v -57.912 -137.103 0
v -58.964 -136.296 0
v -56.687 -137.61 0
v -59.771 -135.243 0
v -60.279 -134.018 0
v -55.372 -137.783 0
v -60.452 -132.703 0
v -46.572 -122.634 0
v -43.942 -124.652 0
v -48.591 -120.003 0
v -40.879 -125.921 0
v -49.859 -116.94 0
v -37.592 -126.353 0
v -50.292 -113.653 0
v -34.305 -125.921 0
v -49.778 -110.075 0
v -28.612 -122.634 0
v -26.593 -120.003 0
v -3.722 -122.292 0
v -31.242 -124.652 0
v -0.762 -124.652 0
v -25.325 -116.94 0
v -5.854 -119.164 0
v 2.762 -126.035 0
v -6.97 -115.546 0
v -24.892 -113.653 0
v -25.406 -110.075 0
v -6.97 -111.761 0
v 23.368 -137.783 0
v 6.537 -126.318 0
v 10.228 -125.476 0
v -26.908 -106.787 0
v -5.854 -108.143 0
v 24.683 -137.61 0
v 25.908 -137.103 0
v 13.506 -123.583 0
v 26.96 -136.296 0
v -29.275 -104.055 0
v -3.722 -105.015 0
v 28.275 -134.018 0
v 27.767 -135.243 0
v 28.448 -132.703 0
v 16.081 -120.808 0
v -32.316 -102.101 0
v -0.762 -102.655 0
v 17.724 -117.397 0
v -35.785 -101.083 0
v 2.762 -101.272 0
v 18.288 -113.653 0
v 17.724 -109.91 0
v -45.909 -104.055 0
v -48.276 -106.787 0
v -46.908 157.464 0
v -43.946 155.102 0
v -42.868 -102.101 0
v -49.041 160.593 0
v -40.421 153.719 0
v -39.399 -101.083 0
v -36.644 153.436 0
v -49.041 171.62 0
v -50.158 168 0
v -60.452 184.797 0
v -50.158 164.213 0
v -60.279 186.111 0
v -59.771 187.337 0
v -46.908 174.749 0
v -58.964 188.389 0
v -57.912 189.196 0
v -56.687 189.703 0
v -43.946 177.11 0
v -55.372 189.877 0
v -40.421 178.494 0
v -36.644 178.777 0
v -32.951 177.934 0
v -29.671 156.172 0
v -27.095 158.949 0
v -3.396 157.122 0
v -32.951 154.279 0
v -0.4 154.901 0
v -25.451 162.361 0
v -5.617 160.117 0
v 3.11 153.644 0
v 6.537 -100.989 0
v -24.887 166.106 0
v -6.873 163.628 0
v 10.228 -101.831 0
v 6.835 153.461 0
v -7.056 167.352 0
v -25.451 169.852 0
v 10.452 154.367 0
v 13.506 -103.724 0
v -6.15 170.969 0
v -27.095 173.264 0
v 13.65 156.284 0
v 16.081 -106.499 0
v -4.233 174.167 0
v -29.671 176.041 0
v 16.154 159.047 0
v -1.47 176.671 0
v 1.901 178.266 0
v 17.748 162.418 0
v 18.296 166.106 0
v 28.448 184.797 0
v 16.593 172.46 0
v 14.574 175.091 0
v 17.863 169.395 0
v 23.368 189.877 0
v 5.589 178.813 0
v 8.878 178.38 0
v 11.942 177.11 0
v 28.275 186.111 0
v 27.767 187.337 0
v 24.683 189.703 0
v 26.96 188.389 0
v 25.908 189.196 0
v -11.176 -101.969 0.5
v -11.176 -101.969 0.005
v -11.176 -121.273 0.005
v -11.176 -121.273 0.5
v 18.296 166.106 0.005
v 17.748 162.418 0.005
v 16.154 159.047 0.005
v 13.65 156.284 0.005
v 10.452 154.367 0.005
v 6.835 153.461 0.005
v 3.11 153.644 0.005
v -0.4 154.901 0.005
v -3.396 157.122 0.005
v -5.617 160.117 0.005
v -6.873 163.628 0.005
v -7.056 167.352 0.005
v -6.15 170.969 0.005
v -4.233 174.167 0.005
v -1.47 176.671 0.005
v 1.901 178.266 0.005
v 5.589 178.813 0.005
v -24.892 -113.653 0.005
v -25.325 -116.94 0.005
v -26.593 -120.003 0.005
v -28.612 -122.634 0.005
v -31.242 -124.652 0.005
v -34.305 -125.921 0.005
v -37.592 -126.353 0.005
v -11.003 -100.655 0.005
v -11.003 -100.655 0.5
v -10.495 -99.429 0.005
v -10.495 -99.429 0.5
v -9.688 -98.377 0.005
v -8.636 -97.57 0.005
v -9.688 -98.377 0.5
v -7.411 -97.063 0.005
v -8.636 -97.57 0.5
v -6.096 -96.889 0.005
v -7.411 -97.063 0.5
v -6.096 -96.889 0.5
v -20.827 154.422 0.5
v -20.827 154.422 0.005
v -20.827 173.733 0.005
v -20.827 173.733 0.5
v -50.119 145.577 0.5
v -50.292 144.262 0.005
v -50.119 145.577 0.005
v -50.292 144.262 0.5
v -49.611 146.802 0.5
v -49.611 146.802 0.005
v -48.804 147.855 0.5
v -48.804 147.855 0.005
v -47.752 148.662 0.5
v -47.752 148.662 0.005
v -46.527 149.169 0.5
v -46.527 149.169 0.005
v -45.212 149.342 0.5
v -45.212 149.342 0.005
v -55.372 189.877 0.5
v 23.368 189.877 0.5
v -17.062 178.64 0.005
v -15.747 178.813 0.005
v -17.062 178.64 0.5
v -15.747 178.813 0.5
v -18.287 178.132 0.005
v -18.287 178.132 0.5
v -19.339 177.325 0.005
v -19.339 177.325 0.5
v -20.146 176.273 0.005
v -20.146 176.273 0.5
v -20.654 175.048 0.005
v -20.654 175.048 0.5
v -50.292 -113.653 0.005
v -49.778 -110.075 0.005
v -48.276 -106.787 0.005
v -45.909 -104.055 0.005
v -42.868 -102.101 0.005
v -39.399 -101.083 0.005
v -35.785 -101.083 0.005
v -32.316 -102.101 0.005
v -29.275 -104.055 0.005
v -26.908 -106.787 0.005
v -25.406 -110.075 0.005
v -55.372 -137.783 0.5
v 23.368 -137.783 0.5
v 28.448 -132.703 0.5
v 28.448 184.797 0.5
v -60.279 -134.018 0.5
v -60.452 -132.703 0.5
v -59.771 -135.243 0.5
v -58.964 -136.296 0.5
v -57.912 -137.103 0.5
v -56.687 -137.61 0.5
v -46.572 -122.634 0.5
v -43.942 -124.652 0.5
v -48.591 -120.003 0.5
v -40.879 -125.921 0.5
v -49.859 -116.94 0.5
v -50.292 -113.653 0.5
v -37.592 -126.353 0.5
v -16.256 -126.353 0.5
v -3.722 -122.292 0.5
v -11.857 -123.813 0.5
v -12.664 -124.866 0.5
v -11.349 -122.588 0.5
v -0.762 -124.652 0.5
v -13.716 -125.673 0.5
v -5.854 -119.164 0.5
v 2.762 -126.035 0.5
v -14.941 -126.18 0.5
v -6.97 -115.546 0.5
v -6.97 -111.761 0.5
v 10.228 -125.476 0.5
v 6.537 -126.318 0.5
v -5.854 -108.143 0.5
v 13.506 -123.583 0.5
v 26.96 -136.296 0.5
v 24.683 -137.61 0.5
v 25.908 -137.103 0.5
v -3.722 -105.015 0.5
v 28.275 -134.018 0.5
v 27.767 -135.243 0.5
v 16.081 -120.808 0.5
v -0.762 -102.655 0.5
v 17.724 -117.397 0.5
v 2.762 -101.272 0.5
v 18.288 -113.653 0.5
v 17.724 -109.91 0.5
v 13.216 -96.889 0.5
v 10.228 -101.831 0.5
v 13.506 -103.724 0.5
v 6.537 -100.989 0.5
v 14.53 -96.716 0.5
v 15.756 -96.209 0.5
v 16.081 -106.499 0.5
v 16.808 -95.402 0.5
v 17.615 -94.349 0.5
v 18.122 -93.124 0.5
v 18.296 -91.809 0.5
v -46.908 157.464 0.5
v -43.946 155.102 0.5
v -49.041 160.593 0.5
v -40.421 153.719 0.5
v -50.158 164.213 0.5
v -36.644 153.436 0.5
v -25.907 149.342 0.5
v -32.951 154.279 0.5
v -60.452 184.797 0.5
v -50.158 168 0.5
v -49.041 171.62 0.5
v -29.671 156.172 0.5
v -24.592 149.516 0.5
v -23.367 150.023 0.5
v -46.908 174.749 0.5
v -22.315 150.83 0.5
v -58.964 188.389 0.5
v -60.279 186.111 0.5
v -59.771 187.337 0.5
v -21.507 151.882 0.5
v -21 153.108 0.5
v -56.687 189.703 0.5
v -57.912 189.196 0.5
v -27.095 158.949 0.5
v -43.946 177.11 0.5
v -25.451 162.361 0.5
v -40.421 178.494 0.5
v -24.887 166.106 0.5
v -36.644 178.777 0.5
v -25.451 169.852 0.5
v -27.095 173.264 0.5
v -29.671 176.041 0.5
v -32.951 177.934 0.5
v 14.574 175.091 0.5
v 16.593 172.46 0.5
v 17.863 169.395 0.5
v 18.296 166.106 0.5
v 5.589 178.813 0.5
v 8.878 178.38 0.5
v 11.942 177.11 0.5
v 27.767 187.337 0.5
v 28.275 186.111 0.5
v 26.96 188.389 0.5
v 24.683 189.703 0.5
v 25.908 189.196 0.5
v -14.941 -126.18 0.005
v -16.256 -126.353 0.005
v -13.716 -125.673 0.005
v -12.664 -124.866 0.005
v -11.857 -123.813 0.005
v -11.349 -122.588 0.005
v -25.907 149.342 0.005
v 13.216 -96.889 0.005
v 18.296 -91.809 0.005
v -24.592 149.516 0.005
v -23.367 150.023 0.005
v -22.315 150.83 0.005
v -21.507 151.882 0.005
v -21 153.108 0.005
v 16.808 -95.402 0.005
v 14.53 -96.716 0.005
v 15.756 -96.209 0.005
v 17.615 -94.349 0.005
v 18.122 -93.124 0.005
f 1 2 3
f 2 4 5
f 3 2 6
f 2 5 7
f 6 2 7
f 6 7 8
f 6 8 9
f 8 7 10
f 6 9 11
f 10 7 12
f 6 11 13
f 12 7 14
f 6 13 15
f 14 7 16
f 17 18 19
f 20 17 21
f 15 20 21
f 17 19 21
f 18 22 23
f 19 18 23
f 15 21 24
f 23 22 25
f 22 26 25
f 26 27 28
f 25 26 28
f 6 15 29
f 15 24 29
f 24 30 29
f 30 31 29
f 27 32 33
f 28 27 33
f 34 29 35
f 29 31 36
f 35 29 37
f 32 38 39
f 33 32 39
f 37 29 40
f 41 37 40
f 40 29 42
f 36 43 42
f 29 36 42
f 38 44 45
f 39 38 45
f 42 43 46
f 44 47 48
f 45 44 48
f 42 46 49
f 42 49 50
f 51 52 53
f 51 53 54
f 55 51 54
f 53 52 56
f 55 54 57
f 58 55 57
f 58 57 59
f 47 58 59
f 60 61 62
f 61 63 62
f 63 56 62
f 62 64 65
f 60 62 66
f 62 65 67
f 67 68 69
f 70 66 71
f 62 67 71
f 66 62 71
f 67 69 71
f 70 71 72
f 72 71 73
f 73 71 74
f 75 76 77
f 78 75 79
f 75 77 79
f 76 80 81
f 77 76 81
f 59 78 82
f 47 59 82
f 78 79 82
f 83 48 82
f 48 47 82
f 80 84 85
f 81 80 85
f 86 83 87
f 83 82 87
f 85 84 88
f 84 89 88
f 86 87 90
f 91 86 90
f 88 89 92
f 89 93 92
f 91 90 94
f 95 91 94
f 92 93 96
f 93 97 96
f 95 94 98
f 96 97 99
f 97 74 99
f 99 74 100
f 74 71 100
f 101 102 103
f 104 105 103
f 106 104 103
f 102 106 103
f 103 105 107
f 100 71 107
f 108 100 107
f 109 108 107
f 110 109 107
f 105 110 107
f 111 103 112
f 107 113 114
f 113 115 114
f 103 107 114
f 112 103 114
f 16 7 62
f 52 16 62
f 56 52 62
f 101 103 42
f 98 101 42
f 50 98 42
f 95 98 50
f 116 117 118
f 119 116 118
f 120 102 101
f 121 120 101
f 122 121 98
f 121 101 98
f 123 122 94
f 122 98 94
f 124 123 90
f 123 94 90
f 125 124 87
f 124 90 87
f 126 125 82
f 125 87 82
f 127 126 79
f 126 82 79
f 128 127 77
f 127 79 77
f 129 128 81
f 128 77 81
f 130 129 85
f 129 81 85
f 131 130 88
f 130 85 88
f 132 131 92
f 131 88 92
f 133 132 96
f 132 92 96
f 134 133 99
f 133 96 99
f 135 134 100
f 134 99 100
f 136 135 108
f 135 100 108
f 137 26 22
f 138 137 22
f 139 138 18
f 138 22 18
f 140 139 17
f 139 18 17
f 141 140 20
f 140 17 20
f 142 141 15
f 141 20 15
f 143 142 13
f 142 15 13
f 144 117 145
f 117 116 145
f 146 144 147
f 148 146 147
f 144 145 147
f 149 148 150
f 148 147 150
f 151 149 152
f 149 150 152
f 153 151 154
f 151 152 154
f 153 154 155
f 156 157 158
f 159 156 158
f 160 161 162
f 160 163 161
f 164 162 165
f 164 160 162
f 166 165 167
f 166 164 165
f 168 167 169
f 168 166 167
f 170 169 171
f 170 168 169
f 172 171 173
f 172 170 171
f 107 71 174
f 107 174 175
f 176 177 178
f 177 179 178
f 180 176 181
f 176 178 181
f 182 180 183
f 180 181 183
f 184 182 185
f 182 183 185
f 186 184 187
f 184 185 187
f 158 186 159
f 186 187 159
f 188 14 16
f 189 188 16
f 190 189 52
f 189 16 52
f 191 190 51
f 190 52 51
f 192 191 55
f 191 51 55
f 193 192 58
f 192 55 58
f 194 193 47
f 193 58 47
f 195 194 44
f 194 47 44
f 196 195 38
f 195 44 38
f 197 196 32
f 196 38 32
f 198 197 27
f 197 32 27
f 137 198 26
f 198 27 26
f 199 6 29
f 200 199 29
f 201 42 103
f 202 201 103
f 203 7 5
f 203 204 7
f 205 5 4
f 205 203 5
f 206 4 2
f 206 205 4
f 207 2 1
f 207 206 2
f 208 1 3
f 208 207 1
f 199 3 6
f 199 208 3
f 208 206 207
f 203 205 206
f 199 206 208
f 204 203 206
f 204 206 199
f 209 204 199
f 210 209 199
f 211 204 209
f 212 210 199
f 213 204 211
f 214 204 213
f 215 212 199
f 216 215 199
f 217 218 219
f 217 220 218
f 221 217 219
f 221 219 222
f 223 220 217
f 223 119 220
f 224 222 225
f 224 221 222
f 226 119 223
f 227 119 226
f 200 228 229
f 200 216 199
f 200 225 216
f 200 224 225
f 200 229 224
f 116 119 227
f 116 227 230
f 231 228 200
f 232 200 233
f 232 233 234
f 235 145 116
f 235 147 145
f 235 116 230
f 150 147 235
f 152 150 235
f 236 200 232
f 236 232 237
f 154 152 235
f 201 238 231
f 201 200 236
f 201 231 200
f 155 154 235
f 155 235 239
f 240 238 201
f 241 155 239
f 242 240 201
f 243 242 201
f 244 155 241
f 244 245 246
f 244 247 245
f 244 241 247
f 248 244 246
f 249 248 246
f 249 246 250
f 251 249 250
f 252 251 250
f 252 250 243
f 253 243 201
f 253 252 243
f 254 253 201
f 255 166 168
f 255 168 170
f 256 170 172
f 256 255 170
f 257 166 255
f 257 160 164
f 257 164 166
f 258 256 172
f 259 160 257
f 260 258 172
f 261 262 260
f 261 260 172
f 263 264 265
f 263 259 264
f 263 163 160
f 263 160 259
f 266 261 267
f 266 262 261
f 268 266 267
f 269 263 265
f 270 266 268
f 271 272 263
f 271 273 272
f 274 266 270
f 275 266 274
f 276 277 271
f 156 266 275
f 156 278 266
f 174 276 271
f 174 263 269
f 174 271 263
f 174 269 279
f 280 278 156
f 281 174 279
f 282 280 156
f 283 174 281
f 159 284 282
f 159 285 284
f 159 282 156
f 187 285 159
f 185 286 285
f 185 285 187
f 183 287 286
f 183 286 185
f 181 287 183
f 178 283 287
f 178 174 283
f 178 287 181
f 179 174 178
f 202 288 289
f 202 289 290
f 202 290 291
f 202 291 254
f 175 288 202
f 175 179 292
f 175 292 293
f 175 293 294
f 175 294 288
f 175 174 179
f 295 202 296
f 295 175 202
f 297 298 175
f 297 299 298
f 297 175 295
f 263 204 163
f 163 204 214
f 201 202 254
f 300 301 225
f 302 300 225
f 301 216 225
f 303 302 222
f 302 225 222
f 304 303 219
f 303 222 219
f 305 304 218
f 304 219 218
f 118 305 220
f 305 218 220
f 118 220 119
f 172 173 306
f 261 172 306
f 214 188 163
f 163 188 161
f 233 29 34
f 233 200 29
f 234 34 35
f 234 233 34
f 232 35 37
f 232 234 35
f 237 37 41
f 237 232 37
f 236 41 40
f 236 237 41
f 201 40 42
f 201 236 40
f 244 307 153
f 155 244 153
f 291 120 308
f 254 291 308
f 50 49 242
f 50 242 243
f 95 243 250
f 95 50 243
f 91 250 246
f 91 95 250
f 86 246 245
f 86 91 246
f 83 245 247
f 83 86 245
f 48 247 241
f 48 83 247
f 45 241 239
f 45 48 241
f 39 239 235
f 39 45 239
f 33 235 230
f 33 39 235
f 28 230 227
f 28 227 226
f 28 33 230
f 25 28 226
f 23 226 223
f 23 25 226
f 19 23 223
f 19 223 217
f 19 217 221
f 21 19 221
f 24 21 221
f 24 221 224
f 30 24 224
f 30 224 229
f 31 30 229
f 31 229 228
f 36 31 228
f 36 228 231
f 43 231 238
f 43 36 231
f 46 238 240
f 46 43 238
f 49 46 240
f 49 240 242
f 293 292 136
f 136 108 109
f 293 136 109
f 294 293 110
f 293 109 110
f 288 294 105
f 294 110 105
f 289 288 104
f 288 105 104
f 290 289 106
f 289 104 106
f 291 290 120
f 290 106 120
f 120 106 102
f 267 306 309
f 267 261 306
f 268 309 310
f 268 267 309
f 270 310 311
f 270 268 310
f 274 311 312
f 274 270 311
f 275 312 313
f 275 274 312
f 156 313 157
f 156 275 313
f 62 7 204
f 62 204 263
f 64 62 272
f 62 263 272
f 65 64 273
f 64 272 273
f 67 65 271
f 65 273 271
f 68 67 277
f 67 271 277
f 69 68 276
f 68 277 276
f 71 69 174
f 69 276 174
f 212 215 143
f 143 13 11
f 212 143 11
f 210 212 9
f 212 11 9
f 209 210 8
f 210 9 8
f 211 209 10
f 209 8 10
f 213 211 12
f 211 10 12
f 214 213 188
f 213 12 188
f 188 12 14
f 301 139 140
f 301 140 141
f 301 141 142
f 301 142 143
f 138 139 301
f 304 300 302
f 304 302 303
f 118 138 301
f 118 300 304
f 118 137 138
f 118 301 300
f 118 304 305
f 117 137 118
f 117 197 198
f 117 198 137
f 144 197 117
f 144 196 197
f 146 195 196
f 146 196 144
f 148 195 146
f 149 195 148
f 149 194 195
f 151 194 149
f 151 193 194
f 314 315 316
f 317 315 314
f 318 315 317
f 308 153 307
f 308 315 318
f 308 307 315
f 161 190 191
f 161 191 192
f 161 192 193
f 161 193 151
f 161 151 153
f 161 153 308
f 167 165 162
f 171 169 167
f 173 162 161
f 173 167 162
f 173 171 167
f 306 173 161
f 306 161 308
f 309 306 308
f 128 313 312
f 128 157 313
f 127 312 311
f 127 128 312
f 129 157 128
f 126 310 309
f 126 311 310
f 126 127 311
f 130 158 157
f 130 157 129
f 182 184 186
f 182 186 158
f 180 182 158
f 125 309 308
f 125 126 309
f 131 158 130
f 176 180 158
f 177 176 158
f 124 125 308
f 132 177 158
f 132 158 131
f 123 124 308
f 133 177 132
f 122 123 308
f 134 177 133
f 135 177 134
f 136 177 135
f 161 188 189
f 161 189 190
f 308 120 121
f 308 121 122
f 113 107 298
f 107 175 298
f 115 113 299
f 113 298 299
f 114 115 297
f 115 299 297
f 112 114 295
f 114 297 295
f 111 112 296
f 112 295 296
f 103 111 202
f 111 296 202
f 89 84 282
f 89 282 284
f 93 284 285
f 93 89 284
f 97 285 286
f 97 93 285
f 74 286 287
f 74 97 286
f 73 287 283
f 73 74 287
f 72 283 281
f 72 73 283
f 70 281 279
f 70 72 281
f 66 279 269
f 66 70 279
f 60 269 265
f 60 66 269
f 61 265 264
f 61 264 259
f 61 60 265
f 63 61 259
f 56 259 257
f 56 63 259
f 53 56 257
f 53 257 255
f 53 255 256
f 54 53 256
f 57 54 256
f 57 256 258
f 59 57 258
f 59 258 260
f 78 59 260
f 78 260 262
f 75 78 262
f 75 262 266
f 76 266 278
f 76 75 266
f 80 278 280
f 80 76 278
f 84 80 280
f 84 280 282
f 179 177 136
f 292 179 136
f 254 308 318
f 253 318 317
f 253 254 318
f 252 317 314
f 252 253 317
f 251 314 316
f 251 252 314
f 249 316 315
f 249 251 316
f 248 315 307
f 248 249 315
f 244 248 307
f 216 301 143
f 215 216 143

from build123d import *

# Parameters (mm, degrees)
F0_W     = 88.9
F0_H     = 327.66
F0_R     = 12.7
F0_R_2   = 12.7063161154
F1_DEPTH = 0.5
F2_DEPTH = 0.005
F3_R     = 5.08
F4_R     = 5.08


# Not quite as in the source:
# - a feature names something its author has since deleted; it is built from what else it names


with BuildPart() as f1:
    # F0 (on Top) → F1 (new body)
    with BuildSketch(Plane.XY):
        with Locations((-16.0019993782, 26.0465461761)):
            Rectangle(F0_W, F0_H)
        with Locations((5.5880006218, -113.6534538239)):
            Circle(F0_R, mode=Mode.SUBTRACT)
        with Locations((-37.5932163954, 166.1064843748)):
            Circle(F0_R_2, mode=Mode.SUBTRACT)
        with BuildLine():
            ThreePointArc((5.589217639, 178.8128004902), (14.573939928, 175.0912066639), (18.2955337543, 166.1064843748))
            Line((18.2955337543, 166.1064843748), (18.2955337543, -96.8894538239))
            Line((18.2955337543, -96.8894538239), (-11.1759993782, -96.8894538239))
            Line((-11.1759993782, -96.8894538239), (-11.1759993782, -126.3534538239))
            Line((-11.1759993782, -126.3534538239), (-37.5919993782, -126.3534538239))
            ThreePointArc((-37.5919993782, -126.3534538239), (-46.5722554993, -122.633709945), (-50.2919993782, -113.6534538239))
            Line((-50.2919993782, -113.6534538239), (-50.2919993782, 149.3424895761))
            Line((-50.2919993782, 149.3424895761), (-20.826782361, 149.3424895761))
            Line((-20.826782361, 149.3424895761), (-20.826782361, 178.8128004902))
            Line((-20.826782361, 178.8128004902), (5.589217639, 178.8128004902))
        make_face(mode=Mode.SUBTRACT)
    extrude(amount=F1_DEPTH)

    # F0 (on Top) → F2 (join)
    with BuildSketch(Plane.XY):
        with BuildLine():
            Line((18.2955337543, -96.8894538239), (18.2955337543, 166.1064843748))
            ThreePointArc((18.2955337543, 166.1064843748), (-3.3955046501, 157.1217620858), (5.589217639, 178.8128004902))
            Line((5.589217639, 178.8128004902), (-20.826782361, 178.8128004902))
            Line((-20.826782361, 178.8128004902), (-20.826782361, 149.3424895761))
            Line((-20.826782361, 149.3424895761), (-50.2919993782, 149.3424895761))
            Line((-50.2919993782, 149.3424895761), (-50.2919993782, -113.6534538239))
            ThreePointArc((-50.2919993782, -113.6534538239), (-37.5919993782, -100.9534538239), (-24.8919993782, -113.6534538239))
            ThreePointArc((-24.8919993782, -113.6534538239), (-28.6117432571, -122.633709945), (-37.5919993782, -126.3534538239))
            Line((-37.5919993782, -126.3534538239), (-11.1759993782, -126.3534538239))
            Line((-11.1759993782, -126.3534538239), (-11.1759993782, -96.8894538239))
            Line((-11.1759993782, -96.8894538239), (18.2955337543, -96.8894538239))
        make_face()
    extrude(amount=F2_DEPTH)

    # F3
    f3_edges = [f1.edges().sort_by_distance(p)[0] for p in [
        (28.448001, 189.876546, 0.25),
        (-60.451999, 189.876546, 0.25),
        (-60.451999, -137.783454, 0.25),
        (28.448001, -137.783454, 0.25),
        (18.295534, -96.889454, 0.2525),
        (-11.175999, -96.889454, 0.2525),
        (-11.175999, -126.353454, 0.2525),
    ]]
    fillet(f3_edges, radius=F3_R)

    # F4
    f4_edges = [f1.edges().sort_by_distance(p)[0] for p in [
        (-20.826782, 149.34249, 0.2525),
        (-50.291999, 149.34249, 0.2525),
        (-20.826782, 178.8128, 0.2525),
    ]]
    fillet(f4_edges, radius=F4_R)


solid = f1.part
